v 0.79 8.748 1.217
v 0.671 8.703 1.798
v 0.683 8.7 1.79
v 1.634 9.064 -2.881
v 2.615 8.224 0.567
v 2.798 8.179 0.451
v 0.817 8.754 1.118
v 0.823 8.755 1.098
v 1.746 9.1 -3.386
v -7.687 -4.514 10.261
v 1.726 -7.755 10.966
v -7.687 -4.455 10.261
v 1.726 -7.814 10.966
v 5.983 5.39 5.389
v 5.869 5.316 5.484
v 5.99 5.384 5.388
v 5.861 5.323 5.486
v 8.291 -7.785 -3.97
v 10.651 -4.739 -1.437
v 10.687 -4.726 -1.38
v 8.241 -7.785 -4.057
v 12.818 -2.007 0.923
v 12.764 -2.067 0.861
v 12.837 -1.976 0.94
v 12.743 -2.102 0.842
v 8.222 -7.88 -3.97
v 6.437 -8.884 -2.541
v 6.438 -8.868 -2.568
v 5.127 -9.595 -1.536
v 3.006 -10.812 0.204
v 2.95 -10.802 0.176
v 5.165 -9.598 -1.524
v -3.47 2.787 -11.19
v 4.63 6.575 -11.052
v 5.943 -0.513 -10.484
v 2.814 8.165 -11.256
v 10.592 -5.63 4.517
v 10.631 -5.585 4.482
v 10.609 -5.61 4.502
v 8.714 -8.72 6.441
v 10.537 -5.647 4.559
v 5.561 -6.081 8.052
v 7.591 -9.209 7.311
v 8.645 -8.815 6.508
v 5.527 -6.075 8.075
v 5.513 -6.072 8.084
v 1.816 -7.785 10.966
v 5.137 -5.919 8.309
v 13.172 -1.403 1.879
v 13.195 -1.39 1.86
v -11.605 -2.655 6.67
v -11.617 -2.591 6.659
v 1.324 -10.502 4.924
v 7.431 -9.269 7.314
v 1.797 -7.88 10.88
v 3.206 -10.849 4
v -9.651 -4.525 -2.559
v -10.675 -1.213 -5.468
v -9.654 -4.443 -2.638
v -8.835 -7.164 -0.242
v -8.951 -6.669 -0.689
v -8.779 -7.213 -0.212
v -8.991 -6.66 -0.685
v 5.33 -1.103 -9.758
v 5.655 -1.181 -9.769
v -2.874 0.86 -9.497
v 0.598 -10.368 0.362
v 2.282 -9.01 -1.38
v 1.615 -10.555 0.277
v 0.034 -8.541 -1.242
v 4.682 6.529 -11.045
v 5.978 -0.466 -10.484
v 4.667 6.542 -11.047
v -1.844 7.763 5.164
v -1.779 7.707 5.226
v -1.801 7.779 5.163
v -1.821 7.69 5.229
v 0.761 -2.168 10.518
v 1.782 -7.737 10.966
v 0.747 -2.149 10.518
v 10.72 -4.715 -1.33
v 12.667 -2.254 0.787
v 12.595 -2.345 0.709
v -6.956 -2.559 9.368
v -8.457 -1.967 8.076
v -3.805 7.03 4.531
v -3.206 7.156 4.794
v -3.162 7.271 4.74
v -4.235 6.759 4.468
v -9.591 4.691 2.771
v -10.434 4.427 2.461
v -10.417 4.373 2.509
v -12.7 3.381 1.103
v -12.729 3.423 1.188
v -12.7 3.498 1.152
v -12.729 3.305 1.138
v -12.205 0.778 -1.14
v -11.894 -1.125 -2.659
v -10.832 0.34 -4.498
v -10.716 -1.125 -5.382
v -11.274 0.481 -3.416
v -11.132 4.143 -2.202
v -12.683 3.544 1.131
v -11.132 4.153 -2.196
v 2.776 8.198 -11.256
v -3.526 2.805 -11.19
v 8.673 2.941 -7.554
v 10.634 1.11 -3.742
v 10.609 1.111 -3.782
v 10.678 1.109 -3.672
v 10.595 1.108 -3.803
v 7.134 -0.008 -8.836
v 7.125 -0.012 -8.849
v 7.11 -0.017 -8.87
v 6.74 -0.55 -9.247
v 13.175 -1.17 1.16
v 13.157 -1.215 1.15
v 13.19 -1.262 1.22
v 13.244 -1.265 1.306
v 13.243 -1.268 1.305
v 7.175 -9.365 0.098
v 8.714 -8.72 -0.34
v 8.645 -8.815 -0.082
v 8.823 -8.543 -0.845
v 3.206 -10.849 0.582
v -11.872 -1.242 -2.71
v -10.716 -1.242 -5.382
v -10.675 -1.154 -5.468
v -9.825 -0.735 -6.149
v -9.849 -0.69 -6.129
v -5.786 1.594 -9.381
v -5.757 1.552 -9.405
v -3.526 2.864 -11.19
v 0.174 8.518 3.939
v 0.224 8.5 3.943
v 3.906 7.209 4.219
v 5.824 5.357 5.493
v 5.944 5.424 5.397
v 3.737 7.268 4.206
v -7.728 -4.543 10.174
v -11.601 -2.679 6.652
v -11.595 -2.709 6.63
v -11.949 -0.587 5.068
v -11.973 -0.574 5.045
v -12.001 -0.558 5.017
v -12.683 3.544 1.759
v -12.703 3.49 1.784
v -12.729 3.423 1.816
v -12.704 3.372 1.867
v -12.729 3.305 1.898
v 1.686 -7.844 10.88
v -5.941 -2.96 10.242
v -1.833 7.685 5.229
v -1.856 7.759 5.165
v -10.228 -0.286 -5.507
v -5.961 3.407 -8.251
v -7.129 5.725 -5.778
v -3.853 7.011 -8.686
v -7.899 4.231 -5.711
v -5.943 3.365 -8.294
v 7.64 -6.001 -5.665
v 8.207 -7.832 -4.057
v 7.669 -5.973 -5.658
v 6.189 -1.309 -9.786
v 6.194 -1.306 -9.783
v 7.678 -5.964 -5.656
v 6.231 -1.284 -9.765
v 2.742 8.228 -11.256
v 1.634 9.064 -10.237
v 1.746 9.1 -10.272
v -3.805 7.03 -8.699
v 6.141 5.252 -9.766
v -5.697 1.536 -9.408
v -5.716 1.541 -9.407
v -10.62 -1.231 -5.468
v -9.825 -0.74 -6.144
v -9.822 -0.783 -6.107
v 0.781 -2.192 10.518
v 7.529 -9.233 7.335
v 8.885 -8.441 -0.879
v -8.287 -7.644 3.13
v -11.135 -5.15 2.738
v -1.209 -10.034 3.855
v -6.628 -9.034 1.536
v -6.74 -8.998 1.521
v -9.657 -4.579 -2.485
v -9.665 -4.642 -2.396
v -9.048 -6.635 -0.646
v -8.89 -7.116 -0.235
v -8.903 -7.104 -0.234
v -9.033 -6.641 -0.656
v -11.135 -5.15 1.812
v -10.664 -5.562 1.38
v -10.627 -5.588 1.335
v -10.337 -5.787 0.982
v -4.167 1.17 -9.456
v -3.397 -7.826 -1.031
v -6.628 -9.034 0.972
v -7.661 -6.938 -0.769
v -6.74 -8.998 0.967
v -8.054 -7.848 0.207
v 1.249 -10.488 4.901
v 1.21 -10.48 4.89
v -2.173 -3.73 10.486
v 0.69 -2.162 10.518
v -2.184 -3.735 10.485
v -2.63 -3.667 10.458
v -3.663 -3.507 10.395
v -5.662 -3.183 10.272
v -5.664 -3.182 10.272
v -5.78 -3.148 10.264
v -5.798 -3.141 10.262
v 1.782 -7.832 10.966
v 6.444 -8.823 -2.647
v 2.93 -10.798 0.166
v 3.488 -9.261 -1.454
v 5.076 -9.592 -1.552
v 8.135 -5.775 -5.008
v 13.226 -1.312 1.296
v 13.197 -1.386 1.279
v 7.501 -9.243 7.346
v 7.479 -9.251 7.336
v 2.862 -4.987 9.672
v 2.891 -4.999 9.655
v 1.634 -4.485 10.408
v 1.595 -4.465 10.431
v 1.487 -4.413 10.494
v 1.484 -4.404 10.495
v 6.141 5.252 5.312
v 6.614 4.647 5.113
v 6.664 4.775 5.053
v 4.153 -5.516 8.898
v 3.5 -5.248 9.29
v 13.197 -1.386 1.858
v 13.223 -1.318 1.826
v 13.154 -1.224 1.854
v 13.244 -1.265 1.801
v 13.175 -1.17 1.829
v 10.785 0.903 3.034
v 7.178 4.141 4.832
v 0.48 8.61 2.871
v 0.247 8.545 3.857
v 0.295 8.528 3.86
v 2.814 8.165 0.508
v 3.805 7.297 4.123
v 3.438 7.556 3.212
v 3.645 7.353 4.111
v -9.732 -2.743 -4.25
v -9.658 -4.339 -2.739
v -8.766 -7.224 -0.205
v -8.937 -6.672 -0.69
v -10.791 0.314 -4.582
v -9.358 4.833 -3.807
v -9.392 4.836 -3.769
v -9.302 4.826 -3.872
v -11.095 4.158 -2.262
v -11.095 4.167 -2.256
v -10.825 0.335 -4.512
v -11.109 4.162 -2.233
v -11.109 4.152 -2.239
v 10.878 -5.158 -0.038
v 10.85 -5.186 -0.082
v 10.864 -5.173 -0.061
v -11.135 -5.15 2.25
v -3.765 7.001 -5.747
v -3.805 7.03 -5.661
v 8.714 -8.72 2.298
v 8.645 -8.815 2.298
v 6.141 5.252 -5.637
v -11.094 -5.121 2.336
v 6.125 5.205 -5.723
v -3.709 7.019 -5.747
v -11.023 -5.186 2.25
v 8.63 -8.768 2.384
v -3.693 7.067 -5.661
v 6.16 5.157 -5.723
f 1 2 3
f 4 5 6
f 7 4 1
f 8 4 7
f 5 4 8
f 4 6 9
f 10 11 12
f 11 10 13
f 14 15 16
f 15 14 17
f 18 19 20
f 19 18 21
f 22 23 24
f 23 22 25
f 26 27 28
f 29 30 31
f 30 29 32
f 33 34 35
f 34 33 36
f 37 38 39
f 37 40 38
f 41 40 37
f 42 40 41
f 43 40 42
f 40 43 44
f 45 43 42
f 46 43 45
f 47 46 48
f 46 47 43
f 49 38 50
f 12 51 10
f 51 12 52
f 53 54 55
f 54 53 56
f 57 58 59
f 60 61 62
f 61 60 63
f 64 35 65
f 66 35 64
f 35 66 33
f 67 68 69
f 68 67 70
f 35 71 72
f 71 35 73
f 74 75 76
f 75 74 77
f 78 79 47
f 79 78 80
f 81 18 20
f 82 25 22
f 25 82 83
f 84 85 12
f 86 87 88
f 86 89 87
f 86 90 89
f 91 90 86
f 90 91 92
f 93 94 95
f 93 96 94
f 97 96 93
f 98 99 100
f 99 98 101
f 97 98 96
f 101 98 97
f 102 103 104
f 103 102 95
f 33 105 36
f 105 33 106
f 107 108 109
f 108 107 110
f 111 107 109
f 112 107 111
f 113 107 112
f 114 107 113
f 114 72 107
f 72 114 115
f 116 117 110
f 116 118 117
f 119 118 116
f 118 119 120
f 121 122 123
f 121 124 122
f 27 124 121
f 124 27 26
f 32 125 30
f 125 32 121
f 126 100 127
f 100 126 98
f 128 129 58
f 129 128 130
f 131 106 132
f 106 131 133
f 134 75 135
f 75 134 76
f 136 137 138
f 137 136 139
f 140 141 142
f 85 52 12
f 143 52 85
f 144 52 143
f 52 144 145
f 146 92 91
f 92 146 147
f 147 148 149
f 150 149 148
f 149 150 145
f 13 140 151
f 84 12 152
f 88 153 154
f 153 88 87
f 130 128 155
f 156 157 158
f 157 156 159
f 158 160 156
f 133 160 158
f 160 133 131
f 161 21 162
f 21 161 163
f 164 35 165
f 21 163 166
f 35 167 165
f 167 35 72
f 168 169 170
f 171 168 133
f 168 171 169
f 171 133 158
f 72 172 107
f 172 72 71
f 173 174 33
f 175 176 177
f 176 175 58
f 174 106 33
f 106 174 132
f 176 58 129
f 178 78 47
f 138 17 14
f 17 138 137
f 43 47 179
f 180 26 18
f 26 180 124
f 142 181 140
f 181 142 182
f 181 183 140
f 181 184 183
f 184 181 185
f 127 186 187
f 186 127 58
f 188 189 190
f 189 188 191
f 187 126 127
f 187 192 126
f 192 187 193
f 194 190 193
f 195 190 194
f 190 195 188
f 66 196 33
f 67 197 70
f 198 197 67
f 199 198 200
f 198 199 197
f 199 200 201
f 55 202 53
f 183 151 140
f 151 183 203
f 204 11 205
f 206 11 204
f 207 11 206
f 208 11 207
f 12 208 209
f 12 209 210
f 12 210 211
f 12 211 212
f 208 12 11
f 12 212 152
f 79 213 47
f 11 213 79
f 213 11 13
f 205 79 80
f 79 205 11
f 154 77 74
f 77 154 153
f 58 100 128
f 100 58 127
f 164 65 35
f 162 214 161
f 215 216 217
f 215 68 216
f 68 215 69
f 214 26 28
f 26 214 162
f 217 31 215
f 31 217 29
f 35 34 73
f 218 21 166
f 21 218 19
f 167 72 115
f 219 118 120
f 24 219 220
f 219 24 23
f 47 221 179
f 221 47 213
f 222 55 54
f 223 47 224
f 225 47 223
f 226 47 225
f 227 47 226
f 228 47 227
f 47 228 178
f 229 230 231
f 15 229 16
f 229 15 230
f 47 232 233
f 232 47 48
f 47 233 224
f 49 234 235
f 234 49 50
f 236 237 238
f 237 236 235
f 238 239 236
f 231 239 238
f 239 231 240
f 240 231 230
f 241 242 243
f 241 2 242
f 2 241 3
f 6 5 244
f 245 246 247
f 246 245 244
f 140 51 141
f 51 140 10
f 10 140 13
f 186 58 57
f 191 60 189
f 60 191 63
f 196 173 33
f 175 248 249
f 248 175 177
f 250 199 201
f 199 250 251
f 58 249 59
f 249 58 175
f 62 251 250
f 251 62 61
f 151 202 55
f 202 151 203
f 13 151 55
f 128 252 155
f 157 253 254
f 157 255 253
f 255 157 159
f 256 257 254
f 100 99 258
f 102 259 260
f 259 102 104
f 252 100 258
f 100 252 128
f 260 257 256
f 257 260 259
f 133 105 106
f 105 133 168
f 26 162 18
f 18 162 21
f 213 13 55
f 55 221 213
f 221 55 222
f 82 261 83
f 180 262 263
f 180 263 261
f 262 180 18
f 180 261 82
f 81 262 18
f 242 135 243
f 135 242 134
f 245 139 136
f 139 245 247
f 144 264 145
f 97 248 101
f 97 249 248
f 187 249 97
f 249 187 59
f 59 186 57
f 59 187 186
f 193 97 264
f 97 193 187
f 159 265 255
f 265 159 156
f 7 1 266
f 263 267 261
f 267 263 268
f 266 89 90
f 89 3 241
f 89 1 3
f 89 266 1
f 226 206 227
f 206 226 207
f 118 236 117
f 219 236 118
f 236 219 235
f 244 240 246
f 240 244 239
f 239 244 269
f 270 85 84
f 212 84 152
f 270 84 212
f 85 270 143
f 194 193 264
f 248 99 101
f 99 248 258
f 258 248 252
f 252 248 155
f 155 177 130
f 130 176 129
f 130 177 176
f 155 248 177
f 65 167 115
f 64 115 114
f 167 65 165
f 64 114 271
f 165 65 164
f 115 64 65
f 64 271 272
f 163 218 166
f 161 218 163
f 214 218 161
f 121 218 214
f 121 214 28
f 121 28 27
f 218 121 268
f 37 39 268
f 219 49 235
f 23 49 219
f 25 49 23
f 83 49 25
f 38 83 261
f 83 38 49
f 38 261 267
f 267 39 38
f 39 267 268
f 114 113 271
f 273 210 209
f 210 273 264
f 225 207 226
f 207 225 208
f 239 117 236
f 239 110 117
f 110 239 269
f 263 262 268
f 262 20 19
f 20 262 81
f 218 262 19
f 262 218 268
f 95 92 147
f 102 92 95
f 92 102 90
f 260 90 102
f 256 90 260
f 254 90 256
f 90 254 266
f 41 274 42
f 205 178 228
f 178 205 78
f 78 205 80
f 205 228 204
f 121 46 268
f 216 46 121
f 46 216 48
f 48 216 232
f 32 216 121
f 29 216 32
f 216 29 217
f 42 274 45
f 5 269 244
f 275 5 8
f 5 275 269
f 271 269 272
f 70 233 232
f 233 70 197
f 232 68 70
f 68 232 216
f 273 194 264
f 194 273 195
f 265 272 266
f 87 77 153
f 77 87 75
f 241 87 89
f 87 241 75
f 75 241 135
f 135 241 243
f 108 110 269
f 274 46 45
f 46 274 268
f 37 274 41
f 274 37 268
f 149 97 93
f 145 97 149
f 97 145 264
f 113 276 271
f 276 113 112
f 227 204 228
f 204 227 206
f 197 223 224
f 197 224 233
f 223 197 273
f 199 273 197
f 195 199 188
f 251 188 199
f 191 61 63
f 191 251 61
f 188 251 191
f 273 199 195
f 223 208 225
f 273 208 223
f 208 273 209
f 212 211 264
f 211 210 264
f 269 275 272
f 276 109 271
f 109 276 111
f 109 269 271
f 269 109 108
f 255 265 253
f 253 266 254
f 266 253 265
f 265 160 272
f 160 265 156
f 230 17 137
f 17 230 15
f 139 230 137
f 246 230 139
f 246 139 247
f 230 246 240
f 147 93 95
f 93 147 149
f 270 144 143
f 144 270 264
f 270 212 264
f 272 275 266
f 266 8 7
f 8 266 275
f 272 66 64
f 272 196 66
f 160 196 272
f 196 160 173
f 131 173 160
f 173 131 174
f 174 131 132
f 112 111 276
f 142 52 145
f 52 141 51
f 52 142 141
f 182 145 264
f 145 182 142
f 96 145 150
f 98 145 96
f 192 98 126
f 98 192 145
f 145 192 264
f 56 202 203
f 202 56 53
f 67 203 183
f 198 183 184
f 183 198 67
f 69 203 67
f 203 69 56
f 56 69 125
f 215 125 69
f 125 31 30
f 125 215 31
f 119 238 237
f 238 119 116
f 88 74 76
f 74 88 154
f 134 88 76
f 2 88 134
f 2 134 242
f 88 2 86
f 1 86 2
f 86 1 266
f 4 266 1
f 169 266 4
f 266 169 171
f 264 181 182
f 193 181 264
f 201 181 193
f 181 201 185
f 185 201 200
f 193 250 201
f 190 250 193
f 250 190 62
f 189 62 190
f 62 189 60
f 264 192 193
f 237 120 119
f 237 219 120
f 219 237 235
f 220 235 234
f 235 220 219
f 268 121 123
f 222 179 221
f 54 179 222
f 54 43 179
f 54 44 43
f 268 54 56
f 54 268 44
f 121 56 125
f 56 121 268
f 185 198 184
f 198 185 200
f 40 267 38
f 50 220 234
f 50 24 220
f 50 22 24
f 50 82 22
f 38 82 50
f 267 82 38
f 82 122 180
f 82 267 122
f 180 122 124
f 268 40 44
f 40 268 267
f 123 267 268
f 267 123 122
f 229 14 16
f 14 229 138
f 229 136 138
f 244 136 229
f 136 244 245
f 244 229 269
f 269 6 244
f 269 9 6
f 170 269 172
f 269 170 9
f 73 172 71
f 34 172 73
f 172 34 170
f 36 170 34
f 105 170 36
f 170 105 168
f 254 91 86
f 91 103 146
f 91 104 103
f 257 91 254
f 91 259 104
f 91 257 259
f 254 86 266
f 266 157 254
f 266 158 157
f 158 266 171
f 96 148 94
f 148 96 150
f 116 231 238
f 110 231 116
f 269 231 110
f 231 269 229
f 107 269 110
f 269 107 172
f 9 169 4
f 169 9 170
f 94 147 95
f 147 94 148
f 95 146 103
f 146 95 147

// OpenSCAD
// Auto-generated OpenSCAD file

    inner_points = 10*[[-0.8207364448332389, -0.03625987639799513, -1.077103005931804], [-0.3800079511582095, 0.6775294643132357, 1.0518242237897182], [1.314406218043804, -0.12649016604771388, -0.2591223940027388], [-1.2601675662397096, 0.3485174868667573, -0.26540930122634293], [0.6033917278936528, 0.4960926858162208, 1.0542256086650177], [0.7704376603984122, -0.3298307508154513, -1.0732174835834996], [-0.6659377447570157, -0.8939163933116565, -0.5867330828632719], [-0.5614003085180945, -0.3057984452791665, 1.03905571142295], [0.8614304919402382, -0.8720125870409337, 0.22976339159278825], [-1.105368866163486, -0.5091390300469038, 0.2249606218421892], [0.42199937053376757, -0.4872352237761812, 1.0414570962982492], [0.31746193429484665, -1.0753531718086713, -0.5843316979879724], [-0.3724387452492543, 0.6971415864952342, -0.5660731958680674], [0.17152981239613735, 0.9004821712629716, 0.24802189371269331], [0.6109609338026081, 0.5157048079982192, -0.5636718109927679], [-0.1143999812026689, -0.6709636863619204, -1.390535412940297], [-1.2648455927592903, 0.33639652876676684, 0.7345062944329209], [1.3097281915242232, -0.13861112414770457, 0.7407932016565248]];

    outer_points = 10*[[-0.7646716571891983, -0.4484124824111452, 1.017411015424149], [1.3334724658866113, -0.12832498152302135, 0.16218986970952987], [-0.4159593615000292, 1.137644887460793, -0.5946962179229037], [0.17664237883325157, -0.7784874133111438, 1.0879689744258578], [1.1071187428716376, 0.6035724304303223, -0.48053104208131747], [-1.1309196745075054, 0.7358224064074482, -0.022533265133765135], [-0.837148057149246, -0.8502349634644899, 0.10456608600351325], [0.8191262918806799, -0.7784874133111438, -0.39703890778391676], [-0.3485414671567439, 0.2834849295421984, -1.1103177785764728], [0.10416597887320383, -1.1803098943644885, 0.17512404500522194], [0.5927725688657061, -0.046590001357800344, -1.0397598195747642], [-1.06350178016422, -0.1183375515111464, -0.5381548257873341], [-0.00491846562418119, 0.20174994937697738, 1.009417255474962], [0.7100418473832949, 0.6035724304303223, 0.43725430268582344], [-0.23127218863915502, 0.9336473613303209, 0.3666963436841147], [-1.4605786756525627, -0.1183375515111464, 0.3796305189798069], [1.0038134647415542, -0.9824849394416157, 0.5643536538231018], [0.41121172440827325, 0.9336473613303209, -1.1183115385256597]];

    // Convex hull for inner set (I)
    module inner_hull() {
        hull() {
            for (p = inner_points) {
                translate(p) sphere(r=0.1);
            }
        }
    }

    // Convex hull for outer set (O) minus inner hull (O \ I)
    module outer_minus_inner() {
        difference() {
            hull() {
                for (p = outer_points) {
                    translate(p) sphere(r=0.1);
                }
            }
            inner_hull(); // Subtract inner hull
        }
    }

    // Convex hull for outer set (O) minus all translated inner hulls
    module outer_minus_AllTranslationInner() {
        difference() {
            hull() {
                for (p = outer_points) {
                    translate(p) sphere(r=0.1);
                }
            }
            hull() {
                translate([0,0,50]) inner_hull();
                translate([0,0,-50]) inner_hull();
            }; // Subtract translated inner hulls
        }
    }

    // Difference between outer_minus_inner and outer_minus_AllTranslationInner
    module outer_minus_inner_diff() {
        difference() {
            // Outer minus inner
            difference() {
                hull() {
                    for (p = outer_points) {
                        translate(p) sphere(r=0.1);
                    }
                }
                inner_hull();
            }

            // Subtract Outer minus AllTranslationInner
            difference() {
                hull() {
                    for (p = outer_points) {
                        translate(p) sphere(r=0.1);
                    }
                }
                hull() {
                    translate([0,0,50]) inner_hull();
                    translate([0,0,-50]) inner_hull();
                };
            }
        }
    }

    // Rendering all with colors applied
    color([1, 1, 0, 1]) outer_minus_inner_diff(); // Opaque yellow
    
